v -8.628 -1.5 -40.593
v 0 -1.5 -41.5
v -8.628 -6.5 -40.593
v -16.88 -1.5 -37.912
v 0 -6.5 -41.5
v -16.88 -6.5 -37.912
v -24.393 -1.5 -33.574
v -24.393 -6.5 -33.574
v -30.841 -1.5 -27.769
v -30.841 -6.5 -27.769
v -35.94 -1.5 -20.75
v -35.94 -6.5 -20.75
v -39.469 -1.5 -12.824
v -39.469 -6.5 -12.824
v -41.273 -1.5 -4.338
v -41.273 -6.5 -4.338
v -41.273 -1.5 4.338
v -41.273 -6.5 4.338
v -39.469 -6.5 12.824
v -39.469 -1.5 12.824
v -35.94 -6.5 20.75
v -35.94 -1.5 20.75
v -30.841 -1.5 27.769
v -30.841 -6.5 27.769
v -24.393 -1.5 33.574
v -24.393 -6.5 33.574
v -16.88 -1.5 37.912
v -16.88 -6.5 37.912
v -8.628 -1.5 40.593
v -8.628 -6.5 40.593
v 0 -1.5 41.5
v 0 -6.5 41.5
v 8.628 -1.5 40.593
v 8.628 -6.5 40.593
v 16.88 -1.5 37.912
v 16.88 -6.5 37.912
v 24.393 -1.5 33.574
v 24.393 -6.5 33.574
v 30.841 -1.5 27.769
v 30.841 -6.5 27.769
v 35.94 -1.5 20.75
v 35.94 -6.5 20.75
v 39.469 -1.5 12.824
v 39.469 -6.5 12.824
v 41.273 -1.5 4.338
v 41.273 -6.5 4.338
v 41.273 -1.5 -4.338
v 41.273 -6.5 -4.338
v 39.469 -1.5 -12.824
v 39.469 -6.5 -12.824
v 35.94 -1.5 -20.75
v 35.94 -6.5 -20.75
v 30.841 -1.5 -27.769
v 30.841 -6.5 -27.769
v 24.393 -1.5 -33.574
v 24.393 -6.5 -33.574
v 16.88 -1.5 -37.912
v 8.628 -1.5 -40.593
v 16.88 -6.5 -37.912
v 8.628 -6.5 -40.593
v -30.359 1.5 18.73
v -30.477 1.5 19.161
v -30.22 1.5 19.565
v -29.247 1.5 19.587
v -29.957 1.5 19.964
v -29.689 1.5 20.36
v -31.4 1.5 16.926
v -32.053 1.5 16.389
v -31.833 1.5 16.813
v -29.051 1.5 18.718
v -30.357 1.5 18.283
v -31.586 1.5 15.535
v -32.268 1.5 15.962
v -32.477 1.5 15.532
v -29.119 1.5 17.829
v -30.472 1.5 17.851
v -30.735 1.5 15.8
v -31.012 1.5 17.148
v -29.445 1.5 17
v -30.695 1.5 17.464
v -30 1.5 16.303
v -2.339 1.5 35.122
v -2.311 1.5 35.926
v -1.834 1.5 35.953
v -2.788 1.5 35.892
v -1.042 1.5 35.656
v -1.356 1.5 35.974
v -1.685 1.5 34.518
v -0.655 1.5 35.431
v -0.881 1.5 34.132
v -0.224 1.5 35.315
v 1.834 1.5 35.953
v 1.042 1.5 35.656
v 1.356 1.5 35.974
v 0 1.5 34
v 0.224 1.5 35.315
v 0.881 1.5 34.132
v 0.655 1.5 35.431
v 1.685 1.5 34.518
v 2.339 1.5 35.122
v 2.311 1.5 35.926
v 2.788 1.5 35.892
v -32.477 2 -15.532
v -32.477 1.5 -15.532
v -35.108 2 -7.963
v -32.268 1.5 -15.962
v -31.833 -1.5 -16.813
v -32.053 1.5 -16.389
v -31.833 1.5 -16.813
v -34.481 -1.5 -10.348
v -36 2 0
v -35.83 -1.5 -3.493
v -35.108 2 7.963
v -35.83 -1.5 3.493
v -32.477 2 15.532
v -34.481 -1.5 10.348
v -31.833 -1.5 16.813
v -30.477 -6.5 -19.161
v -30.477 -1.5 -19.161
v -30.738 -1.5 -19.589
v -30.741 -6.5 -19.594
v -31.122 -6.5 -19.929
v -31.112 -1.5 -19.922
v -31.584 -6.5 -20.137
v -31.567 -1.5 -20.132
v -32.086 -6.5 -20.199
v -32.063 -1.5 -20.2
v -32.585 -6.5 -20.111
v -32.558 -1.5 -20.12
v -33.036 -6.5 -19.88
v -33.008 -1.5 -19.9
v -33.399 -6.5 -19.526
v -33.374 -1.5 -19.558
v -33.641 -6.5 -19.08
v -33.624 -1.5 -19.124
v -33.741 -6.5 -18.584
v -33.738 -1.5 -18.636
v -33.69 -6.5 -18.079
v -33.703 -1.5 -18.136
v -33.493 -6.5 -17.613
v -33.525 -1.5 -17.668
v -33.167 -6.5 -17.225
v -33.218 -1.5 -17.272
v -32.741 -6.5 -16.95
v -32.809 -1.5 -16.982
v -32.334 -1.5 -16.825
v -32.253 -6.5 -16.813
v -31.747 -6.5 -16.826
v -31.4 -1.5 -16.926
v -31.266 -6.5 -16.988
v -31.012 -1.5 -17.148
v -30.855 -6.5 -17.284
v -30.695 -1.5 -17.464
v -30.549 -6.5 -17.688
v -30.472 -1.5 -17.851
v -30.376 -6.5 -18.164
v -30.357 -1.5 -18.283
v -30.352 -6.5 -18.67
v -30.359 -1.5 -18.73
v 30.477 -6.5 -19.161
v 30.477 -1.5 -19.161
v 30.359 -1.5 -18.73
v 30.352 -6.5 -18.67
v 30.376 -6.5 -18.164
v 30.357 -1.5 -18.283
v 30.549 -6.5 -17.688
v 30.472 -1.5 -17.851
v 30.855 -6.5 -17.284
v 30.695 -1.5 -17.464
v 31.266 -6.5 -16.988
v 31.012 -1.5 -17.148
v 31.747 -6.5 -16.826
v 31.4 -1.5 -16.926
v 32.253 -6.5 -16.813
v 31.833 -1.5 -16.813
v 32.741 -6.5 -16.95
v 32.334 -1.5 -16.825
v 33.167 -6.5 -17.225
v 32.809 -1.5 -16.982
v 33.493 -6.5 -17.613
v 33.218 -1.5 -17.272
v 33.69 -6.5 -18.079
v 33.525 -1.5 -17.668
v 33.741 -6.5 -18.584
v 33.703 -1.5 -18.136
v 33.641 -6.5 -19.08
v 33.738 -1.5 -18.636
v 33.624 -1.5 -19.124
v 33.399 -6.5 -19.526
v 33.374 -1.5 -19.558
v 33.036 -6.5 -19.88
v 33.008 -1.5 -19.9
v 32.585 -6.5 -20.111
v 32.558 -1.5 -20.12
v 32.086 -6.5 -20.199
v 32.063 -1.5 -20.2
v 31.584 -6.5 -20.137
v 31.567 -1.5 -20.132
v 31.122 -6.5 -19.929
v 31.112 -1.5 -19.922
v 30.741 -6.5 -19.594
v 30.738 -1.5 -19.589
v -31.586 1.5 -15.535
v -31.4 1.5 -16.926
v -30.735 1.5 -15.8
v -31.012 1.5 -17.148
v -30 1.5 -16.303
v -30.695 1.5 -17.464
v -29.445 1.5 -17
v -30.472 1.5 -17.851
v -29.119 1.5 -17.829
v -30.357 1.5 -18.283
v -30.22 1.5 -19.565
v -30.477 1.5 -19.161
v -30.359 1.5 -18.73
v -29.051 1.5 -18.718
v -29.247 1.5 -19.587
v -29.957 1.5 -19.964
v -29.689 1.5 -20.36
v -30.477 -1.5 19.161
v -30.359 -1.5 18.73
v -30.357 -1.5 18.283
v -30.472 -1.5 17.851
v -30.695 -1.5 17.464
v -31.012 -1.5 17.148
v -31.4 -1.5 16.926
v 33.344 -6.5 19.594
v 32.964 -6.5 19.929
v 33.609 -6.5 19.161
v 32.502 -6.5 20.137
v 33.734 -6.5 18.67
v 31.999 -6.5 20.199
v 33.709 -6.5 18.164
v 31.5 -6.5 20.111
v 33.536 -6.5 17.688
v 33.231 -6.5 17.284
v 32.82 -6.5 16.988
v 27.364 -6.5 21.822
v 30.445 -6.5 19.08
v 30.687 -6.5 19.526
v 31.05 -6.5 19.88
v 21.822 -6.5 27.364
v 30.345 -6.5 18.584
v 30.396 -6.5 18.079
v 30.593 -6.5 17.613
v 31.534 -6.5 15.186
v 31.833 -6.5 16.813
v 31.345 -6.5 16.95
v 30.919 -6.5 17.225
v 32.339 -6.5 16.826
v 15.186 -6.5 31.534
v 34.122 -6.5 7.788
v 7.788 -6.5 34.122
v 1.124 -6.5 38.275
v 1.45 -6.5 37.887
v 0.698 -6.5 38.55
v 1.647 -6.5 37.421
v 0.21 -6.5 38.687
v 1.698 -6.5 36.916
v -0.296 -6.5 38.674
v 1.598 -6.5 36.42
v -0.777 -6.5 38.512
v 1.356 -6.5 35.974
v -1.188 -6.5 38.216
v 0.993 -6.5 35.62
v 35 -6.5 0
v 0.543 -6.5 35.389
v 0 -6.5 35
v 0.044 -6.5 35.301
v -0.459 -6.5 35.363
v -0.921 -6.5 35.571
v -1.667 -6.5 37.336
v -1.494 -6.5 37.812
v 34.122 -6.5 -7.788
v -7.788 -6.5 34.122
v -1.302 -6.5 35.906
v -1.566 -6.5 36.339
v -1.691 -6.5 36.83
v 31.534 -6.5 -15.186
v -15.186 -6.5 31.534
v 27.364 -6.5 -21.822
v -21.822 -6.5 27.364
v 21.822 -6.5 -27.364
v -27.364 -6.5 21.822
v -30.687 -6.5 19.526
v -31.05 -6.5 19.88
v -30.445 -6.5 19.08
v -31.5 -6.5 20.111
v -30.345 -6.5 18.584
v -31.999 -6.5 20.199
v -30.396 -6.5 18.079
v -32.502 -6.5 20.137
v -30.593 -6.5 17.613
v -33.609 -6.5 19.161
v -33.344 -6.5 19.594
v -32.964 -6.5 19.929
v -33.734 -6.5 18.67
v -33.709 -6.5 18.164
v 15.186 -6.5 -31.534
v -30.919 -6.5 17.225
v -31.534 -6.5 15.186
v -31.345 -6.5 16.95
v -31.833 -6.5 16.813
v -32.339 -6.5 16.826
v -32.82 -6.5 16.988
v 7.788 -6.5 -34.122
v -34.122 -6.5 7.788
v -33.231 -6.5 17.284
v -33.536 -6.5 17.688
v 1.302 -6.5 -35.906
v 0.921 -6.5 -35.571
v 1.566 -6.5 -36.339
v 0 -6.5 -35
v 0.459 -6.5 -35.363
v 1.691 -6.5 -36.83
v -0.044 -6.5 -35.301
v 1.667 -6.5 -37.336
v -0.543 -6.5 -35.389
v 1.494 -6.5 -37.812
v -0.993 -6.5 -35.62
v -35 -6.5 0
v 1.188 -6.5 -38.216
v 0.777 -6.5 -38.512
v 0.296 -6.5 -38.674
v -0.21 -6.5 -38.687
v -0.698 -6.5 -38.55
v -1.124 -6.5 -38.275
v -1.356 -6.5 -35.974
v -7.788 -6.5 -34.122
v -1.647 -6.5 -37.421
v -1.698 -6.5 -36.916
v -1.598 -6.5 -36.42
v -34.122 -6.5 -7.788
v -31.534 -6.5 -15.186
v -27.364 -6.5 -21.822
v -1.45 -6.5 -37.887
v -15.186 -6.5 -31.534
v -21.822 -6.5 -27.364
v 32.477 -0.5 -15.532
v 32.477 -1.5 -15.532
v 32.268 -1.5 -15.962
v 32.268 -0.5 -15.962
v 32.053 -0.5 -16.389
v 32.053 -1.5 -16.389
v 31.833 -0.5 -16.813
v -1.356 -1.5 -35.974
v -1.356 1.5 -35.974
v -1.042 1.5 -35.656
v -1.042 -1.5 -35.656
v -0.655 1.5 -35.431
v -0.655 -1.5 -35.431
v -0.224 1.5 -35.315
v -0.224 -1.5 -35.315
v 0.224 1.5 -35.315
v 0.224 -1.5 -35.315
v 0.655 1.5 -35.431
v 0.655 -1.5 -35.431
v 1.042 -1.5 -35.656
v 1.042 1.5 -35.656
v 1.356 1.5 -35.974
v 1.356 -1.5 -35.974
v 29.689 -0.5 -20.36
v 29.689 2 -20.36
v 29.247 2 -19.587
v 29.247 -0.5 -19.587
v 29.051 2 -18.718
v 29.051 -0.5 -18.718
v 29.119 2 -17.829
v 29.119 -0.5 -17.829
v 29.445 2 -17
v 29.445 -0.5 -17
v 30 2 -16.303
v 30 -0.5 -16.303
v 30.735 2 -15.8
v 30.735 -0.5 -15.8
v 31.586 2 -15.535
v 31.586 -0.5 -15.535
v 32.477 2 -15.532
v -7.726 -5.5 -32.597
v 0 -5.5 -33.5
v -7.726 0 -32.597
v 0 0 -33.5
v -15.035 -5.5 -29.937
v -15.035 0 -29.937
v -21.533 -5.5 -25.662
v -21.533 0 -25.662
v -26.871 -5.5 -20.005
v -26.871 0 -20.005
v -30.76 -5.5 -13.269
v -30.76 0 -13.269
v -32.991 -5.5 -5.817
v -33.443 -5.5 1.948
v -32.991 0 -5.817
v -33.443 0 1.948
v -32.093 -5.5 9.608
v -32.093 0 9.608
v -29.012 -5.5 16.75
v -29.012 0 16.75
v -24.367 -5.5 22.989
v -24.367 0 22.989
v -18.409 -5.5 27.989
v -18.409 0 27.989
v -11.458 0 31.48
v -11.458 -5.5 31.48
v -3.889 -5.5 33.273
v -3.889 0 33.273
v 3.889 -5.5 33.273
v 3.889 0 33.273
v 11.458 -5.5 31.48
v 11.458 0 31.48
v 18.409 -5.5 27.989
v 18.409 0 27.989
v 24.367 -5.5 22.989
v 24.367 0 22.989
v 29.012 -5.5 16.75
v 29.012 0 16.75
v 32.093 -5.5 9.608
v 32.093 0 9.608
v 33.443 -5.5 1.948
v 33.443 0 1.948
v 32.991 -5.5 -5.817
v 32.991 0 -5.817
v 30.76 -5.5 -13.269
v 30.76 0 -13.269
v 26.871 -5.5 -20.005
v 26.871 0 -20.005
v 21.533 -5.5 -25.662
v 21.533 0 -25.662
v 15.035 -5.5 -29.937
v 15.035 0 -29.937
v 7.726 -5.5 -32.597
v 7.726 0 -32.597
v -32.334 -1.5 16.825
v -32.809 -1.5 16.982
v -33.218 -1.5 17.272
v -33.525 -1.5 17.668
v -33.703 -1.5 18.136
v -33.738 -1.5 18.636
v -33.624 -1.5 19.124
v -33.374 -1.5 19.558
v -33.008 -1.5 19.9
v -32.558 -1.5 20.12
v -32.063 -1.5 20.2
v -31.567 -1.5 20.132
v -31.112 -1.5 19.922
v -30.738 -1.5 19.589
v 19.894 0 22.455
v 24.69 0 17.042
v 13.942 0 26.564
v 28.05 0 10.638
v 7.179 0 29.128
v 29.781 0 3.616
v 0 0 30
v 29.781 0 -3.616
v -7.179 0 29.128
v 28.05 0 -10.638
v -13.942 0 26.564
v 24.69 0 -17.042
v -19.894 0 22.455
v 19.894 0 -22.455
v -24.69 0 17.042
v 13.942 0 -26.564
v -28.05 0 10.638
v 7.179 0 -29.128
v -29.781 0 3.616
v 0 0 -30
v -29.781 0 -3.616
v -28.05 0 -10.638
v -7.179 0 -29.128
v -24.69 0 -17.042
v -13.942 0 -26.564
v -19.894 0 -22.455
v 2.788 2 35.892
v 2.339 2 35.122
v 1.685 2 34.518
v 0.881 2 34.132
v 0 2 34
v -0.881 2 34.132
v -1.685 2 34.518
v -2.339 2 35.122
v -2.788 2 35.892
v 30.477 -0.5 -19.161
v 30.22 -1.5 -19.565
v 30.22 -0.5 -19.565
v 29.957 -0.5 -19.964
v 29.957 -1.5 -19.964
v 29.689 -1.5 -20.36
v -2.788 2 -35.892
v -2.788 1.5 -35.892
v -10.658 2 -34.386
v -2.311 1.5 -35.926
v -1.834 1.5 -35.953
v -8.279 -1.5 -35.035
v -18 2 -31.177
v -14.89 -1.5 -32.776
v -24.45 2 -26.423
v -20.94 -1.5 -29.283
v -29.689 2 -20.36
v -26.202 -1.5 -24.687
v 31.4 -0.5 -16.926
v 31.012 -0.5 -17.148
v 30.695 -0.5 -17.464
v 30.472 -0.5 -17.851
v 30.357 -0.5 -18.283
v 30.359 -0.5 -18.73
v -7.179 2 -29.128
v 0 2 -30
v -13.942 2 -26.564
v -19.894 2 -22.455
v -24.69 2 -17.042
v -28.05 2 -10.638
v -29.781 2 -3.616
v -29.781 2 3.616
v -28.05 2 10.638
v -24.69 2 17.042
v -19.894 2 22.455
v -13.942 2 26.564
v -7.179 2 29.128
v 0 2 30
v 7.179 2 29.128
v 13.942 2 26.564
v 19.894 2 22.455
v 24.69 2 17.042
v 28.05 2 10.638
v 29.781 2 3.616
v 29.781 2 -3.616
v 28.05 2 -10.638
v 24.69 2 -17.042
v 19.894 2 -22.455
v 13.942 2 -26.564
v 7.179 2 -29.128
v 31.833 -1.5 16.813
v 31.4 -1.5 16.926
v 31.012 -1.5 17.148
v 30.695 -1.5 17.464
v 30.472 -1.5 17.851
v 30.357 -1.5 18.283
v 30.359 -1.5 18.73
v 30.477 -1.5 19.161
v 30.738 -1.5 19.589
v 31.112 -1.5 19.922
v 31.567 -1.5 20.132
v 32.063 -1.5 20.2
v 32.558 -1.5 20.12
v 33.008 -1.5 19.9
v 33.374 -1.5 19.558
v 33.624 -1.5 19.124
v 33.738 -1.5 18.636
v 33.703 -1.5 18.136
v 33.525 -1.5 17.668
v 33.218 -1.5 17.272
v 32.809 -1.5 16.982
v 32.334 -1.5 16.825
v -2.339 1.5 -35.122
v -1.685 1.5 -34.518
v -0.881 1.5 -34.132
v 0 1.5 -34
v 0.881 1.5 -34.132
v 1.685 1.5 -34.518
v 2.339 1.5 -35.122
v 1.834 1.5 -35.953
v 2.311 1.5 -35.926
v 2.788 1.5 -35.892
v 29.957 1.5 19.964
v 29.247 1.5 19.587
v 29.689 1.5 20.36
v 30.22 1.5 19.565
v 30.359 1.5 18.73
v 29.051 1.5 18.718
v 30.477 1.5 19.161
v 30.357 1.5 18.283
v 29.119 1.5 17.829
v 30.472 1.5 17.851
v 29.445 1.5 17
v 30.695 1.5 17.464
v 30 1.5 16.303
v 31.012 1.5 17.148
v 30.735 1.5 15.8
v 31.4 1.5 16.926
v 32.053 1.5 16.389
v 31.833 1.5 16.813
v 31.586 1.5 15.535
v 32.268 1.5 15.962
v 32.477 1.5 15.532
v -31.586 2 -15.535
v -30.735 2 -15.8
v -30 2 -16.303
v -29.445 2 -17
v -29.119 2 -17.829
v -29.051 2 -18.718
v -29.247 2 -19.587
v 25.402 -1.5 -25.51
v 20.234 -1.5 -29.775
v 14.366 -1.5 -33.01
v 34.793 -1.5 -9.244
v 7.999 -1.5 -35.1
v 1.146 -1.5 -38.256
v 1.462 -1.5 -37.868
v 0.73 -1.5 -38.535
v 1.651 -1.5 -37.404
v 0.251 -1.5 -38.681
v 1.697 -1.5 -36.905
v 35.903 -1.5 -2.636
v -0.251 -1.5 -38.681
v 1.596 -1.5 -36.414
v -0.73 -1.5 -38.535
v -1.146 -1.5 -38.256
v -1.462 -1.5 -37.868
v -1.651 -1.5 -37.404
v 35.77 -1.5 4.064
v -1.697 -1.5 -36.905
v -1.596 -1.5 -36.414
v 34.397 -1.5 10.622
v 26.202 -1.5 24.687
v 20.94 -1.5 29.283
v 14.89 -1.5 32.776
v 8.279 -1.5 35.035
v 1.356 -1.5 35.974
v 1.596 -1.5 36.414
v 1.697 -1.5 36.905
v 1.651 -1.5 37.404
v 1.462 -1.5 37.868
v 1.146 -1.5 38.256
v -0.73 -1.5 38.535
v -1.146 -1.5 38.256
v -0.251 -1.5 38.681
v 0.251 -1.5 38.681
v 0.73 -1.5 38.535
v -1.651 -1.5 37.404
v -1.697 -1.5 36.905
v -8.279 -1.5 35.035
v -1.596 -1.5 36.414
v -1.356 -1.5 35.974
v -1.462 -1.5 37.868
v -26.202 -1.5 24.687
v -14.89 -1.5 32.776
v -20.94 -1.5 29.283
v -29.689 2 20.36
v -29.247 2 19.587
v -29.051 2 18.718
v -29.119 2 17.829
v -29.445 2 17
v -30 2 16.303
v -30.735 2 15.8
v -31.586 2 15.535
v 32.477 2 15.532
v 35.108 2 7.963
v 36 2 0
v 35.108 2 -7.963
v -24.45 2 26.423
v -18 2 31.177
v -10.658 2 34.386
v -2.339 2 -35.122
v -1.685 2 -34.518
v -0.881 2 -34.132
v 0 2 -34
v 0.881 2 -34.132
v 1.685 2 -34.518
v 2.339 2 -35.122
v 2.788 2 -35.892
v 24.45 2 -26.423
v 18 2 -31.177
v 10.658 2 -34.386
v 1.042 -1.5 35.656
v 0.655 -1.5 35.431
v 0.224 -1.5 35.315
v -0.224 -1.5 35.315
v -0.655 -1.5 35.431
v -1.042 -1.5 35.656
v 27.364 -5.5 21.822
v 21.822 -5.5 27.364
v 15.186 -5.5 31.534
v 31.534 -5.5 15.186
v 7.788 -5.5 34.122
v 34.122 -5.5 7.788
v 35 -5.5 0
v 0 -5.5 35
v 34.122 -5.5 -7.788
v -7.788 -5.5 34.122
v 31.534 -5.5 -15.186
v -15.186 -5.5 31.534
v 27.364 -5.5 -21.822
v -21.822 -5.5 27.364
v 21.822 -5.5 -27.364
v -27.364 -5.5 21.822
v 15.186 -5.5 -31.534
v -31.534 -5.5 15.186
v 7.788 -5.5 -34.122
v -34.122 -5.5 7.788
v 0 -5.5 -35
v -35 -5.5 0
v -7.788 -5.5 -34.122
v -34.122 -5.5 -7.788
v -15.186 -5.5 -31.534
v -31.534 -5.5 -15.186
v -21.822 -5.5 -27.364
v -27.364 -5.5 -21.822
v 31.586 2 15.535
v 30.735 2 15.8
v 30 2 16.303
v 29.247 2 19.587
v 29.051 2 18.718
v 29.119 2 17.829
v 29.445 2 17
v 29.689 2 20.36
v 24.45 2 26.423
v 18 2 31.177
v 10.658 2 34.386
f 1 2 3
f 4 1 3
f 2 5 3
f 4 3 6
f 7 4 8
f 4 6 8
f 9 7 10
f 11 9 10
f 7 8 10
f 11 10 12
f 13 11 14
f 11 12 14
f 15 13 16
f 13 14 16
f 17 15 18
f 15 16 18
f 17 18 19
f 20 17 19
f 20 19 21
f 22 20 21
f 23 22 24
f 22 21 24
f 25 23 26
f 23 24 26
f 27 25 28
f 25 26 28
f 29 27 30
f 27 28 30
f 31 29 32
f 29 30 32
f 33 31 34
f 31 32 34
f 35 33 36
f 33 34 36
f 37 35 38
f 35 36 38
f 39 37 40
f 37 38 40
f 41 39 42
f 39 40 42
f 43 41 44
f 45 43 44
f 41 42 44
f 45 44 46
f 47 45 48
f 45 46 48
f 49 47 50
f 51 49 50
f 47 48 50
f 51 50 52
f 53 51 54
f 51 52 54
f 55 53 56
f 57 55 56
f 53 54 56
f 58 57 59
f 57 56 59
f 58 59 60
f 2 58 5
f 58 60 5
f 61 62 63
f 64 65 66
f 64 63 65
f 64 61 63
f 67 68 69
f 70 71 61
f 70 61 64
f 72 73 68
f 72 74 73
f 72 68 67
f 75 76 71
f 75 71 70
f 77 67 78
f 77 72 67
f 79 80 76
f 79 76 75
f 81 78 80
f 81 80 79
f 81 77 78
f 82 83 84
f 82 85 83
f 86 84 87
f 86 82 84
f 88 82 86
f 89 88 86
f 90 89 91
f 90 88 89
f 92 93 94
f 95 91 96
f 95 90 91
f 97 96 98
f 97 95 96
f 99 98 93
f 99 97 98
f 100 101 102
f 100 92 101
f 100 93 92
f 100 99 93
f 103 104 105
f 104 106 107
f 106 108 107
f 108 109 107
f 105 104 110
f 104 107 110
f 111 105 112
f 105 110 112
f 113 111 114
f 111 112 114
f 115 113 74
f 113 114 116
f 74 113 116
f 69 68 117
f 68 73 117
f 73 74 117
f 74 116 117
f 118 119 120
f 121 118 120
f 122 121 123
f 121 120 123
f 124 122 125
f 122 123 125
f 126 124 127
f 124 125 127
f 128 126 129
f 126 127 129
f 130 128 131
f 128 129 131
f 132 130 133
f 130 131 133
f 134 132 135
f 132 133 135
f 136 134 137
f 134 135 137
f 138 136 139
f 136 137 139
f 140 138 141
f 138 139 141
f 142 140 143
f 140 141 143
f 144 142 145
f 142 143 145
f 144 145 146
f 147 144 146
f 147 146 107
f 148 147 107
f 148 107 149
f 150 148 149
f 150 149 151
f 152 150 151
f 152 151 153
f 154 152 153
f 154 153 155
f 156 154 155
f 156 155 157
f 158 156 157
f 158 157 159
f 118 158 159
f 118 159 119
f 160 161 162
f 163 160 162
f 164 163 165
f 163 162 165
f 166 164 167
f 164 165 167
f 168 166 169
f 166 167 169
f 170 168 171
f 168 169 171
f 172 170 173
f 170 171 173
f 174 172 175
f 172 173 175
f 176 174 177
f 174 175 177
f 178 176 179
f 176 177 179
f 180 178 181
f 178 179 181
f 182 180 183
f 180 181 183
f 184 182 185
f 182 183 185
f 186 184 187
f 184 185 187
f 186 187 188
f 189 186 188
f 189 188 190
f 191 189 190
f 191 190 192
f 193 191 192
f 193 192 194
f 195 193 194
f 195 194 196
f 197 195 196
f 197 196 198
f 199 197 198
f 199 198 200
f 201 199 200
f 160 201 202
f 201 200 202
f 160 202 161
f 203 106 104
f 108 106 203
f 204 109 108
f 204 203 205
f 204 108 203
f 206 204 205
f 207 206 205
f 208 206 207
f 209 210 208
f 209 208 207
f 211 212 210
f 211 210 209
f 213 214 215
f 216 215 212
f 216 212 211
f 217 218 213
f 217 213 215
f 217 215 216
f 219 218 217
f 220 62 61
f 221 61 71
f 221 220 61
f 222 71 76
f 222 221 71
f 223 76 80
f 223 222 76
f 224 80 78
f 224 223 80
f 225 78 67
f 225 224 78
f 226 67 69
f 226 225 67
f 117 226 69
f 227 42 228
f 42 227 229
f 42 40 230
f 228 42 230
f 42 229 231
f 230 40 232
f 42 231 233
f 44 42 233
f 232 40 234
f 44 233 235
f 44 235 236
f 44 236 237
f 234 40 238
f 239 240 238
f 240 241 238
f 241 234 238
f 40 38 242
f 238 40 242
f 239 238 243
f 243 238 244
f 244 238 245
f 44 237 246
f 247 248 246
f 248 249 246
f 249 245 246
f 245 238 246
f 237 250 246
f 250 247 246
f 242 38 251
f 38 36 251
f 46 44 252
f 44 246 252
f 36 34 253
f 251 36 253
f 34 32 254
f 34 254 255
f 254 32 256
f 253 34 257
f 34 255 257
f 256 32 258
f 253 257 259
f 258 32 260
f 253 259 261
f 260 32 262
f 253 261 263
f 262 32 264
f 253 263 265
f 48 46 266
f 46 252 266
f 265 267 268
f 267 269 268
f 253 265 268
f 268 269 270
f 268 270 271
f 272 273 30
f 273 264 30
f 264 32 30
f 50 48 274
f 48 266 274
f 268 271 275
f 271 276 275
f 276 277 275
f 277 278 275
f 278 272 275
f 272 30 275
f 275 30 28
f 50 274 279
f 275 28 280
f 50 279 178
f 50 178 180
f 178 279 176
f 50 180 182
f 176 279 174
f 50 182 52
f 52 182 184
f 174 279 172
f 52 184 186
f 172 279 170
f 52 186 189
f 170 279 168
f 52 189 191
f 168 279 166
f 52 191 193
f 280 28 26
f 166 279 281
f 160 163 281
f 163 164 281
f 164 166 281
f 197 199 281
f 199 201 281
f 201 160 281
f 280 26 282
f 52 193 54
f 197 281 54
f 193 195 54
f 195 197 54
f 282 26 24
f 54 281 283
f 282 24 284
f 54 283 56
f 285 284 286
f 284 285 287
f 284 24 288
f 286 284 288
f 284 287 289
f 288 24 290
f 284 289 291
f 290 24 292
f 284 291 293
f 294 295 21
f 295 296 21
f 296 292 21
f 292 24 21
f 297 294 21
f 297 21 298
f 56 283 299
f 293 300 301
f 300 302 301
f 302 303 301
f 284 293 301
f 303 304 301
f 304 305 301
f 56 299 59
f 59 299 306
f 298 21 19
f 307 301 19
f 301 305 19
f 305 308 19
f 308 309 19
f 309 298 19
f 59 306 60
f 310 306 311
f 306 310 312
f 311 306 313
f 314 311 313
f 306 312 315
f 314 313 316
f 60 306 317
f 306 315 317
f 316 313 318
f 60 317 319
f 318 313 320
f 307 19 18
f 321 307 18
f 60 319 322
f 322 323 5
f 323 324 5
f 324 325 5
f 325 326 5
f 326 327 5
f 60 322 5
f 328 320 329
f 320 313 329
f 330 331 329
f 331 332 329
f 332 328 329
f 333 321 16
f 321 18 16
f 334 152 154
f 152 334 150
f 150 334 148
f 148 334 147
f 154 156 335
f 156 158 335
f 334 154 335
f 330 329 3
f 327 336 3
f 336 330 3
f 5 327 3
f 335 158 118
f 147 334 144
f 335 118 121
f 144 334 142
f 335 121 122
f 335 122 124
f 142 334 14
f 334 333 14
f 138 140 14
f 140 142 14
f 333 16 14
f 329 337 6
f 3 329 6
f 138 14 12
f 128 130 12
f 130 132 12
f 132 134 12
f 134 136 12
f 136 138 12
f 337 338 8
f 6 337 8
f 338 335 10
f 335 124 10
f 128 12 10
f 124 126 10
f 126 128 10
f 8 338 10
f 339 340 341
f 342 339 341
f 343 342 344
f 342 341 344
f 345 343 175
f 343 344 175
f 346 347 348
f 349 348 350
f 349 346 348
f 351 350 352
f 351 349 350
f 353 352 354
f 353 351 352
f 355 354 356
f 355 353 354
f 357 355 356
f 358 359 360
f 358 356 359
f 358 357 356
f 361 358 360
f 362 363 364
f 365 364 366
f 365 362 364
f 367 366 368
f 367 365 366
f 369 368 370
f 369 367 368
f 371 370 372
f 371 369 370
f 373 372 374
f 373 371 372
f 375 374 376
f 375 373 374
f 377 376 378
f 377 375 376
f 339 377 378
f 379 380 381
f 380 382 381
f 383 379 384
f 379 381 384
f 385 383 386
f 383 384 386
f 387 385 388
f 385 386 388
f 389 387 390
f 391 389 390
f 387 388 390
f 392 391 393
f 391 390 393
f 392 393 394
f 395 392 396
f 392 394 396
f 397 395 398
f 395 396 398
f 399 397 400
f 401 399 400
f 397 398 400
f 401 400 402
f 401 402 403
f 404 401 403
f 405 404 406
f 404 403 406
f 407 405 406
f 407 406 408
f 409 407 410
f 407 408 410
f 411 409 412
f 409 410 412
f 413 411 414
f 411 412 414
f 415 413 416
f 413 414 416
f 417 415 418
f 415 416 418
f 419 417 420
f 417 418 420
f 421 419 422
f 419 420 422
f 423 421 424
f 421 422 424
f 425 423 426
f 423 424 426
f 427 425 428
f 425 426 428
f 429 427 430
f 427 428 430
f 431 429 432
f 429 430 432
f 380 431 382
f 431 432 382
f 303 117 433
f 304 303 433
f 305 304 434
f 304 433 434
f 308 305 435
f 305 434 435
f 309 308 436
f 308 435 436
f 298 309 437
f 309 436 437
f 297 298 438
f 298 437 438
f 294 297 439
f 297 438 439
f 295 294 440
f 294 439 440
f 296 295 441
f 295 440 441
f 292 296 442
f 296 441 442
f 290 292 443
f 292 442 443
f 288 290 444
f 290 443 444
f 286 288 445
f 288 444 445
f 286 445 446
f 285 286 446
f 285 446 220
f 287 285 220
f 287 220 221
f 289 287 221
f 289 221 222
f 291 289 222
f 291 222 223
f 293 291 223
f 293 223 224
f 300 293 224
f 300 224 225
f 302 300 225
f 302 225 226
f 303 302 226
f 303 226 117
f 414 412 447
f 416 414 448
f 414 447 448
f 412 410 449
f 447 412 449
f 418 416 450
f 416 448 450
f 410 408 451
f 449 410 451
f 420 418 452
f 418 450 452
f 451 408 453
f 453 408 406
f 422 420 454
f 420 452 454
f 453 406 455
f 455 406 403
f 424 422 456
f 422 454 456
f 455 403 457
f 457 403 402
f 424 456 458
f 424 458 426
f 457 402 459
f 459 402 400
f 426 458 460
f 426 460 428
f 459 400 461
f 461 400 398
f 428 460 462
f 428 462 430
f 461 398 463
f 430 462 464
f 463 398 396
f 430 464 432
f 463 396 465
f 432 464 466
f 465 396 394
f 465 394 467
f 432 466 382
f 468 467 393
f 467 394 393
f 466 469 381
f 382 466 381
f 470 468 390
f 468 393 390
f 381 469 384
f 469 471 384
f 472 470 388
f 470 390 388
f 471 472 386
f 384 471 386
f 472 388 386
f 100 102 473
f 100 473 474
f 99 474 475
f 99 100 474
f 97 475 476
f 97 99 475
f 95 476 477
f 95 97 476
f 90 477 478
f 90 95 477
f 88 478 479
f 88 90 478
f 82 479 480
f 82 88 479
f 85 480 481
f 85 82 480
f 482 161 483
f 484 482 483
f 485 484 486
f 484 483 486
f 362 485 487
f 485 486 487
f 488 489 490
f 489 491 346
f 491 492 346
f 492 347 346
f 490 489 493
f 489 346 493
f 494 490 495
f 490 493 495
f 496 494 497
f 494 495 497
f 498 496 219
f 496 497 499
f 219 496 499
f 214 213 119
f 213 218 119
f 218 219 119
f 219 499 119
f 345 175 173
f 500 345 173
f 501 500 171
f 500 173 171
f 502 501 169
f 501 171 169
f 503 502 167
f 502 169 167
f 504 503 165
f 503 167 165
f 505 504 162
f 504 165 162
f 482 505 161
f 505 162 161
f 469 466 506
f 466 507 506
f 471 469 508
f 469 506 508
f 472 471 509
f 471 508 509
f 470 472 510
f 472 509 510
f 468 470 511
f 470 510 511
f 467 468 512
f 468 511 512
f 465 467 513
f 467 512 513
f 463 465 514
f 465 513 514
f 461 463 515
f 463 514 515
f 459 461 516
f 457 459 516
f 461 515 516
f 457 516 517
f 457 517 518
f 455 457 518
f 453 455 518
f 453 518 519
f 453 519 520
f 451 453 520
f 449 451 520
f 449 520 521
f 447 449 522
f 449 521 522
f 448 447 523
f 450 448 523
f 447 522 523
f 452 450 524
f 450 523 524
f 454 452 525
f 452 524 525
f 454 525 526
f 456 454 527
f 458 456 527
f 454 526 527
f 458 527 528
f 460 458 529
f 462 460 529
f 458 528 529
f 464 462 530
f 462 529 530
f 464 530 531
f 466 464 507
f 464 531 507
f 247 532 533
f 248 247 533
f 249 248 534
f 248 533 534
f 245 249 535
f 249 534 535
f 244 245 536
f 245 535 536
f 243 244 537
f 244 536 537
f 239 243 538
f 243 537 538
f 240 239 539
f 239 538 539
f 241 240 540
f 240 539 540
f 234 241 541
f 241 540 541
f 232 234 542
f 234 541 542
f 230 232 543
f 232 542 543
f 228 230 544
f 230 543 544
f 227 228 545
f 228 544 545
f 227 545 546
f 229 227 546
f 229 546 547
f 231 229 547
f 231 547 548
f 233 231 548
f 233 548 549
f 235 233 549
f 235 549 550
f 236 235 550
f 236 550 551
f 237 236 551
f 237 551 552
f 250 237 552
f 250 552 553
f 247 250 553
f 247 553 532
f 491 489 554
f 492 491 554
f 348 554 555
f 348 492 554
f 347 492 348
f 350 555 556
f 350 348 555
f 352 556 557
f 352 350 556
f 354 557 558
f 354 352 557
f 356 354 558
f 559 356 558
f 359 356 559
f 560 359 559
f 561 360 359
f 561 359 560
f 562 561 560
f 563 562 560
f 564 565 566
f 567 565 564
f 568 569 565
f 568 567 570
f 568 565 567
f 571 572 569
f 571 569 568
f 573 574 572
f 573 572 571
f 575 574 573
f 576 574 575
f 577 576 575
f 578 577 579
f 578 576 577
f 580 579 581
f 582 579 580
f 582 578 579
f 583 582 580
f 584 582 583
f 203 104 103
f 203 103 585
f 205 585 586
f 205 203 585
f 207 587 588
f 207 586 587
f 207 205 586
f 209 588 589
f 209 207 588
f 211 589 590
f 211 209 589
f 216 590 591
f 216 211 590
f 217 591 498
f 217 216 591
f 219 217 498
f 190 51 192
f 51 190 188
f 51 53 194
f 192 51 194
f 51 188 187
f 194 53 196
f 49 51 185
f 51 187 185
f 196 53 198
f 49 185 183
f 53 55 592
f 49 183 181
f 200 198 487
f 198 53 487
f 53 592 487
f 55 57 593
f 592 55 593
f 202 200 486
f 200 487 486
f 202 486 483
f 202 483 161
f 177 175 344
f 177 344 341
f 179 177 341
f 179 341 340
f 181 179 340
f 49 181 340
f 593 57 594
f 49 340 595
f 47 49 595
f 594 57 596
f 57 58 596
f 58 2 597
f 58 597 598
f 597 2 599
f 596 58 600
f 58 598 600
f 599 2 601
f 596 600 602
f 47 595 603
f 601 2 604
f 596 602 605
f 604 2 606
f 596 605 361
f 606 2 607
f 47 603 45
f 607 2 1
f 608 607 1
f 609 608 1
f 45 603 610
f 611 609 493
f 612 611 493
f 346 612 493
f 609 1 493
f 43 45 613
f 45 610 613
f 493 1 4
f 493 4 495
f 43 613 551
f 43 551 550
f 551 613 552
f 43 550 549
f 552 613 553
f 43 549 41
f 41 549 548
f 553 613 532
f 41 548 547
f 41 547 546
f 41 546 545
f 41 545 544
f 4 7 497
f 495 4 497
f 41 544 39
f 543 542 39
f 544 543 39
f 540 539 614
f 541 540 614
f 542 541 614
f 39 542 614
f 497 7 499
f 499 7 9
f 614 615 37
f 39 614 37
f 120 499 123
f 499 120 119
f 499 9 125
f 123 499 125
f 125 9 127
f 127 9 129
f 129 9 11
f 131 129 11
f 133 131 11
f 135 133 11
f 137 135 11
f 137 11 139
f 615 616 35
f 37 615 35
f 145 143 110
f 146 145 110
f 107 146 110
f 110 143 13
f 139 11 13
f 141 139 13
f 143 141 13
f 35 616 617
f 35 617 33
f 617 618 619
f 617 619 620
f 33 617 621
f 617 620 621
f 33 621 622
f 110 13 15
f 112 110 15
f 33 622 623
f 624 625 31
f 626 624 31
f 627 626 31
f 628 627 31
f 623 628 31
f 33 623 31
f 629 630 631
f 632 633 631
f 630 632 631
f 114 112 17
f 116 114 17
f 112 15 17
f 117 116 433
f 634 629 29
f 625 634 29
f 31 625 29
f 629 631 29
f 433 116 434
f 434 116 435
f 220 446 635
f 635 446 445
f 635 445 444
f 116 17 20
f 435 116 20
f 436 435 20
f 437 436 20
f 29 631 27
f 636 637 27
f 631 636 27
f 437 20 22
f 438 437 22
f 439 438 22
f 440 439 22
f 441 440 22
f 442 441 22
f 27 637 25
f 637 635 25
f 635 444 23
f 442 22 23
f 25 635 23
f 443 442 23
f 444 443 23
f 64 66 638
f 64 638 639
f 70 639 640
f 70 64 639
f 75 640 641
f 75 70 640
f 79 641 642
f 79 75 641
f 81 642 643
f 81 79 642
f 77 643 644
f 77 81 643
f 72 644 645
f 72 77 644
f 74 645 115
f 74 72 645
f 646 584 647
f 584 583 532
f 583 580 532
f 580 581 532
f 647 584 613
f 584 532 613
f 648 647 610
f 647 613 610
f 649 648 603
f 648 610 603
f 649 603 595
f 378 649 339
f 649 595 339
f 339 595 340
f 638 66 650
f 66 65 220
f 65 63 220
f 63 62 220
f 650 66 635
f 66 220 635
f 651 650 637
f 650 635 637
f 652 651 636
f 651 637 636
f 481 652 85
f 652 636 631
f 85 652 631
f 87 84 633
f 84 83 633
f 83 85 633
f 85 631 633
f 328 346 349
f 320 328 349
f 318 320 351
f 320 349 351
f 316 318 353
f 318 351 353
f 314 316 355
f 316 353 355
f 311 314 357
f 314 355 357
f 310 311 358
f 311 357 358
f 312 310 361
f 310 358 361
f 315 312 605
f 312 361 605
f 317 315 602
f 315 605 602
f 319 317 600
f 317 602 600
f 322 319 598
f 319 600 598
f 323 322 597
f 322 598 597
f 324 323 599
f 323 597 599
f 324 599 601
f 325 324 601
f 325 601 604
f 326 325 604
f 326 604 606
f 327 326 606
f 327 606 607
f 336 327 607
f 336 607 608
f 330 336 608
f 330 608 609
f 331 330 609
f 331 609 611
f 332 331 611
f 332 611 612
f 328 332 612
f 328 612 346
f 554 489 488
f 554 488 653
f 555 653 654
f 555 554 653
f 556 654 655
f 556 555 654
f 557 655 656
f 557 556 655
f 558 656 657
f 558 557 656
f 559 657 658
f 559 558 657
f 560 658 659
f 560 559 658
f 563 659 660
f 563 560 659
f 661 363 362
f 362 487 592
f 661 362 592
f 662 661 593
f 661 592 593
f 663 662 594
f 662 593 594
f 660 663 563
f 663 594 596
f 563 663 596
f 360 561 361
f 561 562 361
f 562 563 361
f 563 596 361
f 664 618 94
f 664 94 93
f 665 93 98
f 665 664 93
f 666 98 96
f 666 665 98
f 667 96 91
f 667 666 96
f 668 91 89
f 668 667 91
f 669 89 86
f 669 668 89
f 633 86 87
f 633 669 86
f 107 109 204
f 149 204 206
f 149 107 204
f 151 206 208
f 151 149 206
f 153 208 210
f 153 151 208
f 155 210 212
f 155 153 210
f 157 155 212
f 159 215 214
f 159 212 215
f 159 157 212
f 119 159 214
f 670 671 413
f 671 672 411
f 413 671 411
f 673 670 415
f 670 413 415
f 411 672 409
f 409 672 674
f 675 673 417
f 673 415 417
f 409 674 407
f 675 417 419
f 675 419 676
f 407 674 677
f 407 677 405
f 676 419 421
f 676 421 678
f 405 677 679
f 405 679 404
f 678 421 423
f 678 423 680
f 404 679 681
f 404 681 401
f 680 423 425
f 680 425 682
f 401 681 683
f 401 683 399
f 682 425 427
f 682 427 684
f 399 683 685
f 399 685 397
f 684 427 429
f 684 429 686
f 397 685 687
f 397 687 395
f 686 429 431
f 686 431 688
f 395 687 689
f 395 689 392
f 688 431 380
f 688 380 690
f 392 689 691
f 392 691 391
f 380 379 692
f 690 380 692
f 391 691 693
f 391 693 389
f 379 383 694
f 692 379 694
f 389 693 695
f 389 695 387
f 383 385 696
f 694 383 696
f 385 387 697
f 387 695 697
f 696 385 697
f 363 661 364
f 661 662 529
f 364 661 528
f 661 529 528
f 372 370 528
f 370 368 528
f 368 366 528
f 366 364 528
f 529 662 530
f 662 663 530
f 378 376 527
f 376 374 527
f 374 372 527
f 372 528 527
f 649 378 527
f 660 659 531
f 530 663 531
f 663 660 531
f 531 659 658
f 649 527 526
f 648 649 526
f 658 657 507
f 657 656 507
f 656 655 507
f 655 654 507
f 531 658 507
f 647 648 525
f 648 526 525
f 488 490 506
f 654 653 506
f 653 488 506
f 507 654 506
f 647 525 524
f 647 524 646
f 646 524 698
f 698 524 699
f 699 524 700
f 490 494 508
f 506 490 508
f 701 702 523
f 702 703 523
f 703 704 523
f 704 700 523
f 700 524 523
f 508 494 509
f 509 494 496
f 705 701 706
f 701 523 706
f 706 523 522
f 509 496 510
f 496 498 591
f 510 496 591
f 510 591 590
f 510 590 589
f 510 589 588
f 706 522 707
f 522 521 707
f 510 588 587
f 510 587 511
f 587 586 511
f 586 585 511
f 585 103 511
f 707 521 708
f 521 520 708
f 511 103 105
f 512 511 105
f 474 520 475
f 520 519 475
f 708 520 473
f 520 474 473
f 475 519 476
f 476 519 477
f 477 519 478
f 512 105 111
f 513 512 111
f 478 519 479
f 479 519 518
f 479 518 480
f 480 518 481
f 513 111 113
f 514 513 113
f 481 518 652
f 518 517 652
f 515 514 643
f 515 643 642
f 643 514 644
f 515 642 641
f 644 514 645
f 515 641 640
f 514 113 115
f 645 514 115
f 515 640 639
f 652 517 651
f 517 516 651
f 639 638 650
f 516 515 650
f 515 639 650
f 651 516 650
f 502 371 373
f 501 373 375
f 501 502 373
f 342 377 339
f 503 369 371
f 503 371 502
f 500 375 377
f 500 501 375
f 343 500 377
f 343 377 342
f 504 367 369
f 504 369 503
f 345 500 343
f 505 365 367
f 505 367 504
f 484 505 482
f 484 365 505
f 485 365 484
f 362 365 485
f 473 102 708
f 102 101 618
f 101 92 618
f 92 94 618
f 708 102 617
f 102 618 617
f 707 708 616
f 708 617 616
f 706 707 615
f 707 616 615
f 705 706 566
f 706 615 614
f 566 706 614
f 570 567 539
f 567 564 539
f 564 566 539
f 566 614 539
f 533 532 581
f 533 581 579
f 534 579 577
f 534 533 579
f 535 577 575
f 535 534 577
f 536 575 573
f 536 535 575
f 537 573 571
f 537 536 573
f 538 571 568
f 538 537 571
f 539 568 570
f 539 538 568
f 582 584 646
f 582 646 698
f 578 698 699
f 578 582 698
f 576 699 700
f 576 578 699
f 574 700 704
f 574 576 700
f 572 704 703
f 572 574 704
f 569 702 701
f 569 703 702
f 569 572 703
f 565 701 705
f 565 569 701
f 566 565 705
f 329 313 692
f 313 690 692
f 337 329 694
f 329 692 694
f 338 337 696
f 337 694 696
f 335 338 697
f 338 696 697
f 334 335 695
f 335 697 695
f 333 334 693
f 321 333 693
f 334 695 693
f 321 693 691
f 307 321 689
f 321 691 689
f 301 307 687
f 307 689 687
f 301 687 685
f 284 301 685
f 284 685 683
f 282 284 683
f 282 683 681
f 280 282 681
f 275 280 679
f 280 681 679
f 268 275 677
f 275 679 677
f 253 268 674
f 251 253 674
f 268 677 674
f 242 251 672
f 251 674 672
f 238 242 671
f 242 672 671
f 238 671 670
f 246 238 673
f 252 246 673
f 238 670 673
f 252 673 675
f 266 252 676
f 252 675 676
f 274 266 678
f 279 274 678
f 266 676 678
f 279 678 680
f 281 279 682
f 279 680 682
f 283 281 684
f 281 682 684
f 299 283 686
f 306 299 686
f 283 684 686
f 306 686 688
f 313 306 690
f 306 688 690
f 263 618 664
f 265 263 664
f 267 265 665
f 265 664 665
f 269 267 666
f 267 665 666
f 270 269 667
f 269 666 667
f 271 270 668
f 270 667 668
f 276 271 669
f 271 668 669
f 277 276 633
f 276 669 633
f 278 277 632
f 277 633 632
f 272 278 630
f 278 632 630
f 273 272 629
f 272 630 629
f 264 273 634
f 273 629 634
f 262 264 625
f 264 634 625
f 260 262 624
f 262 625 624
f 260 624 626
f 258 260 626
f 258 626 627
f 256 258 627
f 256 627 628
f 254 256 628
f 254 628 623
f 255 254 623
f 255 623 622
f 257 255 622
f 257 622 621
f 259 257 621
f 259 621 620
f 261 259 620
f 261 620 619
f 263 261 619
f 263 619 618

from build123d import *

# Parameters (mm, degrees)
SKETCH_3_R                      = 1.7
CUT_EXTRUDE_1_DEPTH             = 10
CUT_EXTRUDE_1_DIRECTION_2_REACH = 60.902
CUT_EXTRUDE_START               = 3
SKETCH_4_R                      = 3
CUT_EXTRUDE_2_DEPTH             = 3
SKETCH_7_R                      = 3
CUT_EXTRUDE_3_DEPTH             = 10
EXTRUDE_1_DEPTH                 = 1


with BuildPart() as part:
    # 草图2 → 旋转1 (revolve)
    with BuildSketch(Plane(origin=(0, 0, 0), x_dir=(0, 0, -1), z_dir=(1, 0, 0))):
        Polygon((-30, 0), (-30, 2), (-36, 2), (-36, -1.5), (-41.5, -1.5), (-41.5, -6.5), (-35, -6.5), (-35, -5.5), (-33.5, -5.5), (-33.5, 0), align=None)
    revolve(axis=Axis((0, 0, 0), (0, 1, 0)))

    # 草图3 → 切除-拉伸1 (cut)
    with BuildSketch(Plane(origin=(0, -1.5, 0), x_dir=(1, 0, 0), z_dir=(0, 1, 0))):
        with Locations((0, 37)):
            Circle(SKETCH_3_R)
        with Locations((32.04293994, 18.5)):
            Circle(SKETCH_3_R)
        with Locations((32.04293994, -18.5)):
            Circle(SKETCH_3_R)
        with Locations((0, -37)):
            Circle(SKETCH_3_R)
        with Locations((-32.04293994, -18.5)):
            Circle(SKETCH_3_R)
        with Locations((-32.04293994, 18.5)):
            Circle(SKETCH_3_R)
    extrude(amount=-CUT_EXTRUDE_1_DEPTH, mode=Mode.SUBTRACT)

    # 草图3 → 切除-拉伸1 direction 2 (cut, up to next)
    with BuildSketch(Plane(origin=(0, -1.5, 0), x_dir=(1, 0, 0), z_dir=(0, 1, 0)), mode=Mode.PRIVATE) as cut_extrude_1_direction_2_sk1:
        with Locations((0, 37)):
            Circle(SKETCH_3_R)
    cut_extrude_1_direction_2_tool1 = extrude(cut_extrude_1_direction_2_sk1.sketch, amount=CUT_EXTRUDE_1_DIRECTION_2_REACH, mode=Mode.PRIVATE) & part.part
    # 草图3 → 切除-拉伸1 direction 2 (cut, up to next)
    with BuildSketch(Plane(origin=(0, -1.5, 0), x_dir=(1, 0, 0), z_dir=(0, 1, 0)), mode=Mode.PRIVATE) as cut_extrude_1_direction_2_sk2:
        with Locations((32.04293994, 18.5)):
            Circle(SKETCH_3_R)
    cut_extrude_1_direction_2_tool2 = extrude(cut_extrude_1_direction_2_sk2.sketch, amount=CUT_EXTRUDE_1_DIRECTION_2_REACH, mode=Mode.PRIVATE) & part.part
    # 草图3 → 切除-拉伸1 direction 2 (cut, up to next)
    with BuildSketch(Plane(origin=(0, -1.5, 0), x_dir=(1, 0, 0), z_dir=(0, 1, 0)), mode=Mode.PRIVATE) as cut_extrude_1_direction_2_sk3:
        with Locations((32.04293994, -18.5)):
            Circle(SKETCH_3_R)
    cut_extrude_1_direction_2_tool3 = extrude(cut_extrude_1_direction_2_sk3.sketch, amount=CUT_EXTRUDE_1_DIRECTION_2_REACH, mode=Mode.PRIVATE) & part.part
    # 草图3 → 切除-拉伸1 direction 2 (cut, up to next)
    with BuildSketch(Plane(origin=(0, -1.5, 0), x_dir=(1, 0, 0), z_dir=(0, 1, 0)), mode=Mode.PRIVATE) as cut_extrude_1_direction_2_sk4:
        with Locations((0, -37)):
            Circle(SKETCH_3_R)
    cut_extrude_1_direction_2_tool4 = extrude(cut_extrude_1_direction_2_sk4.sketch, amount=CUT_EXTRUDE_1_DIRECTION_2_REACH, mode=Mode.PRIVATE) & part.part
    # 草图3 → 切除-拉伸1 direction 2 (cut, up to next)
    with BuildSketch(Plane(origin=(0, -1.5, 0), x_dir=(1, 0, 0), z_dir=(0, 1, 0)), mode=Mode.PRIVATE) as cut_extrude_1_direction_2_sk5:
        with Locations((-32.04293994, -18.5)):
            Circle(SKETCH_3_R)
    cut_extrude_1_direction_2_tool5 = extrude(cut_extrude_1_direction_2_sk5.sketch, amount=CUT_EXTRUDE_1_DIRECTION_2_REACH, mode=Mode.PRIVATE) & part.part
    # 草图3 → 切除-拉伸1 direction 2 (cut, up to next)
    with BuildSketch(Plane(origin=(0, -1.5, 0), x_dir=(1, 0, 0), z_dir=(0, 1, 0)), mode=Mode.PRIVATE) as cut_extrude_1_direction_2_sk6:
        with Locations((-32.04293994, 18.5)):
            Circle(SKETCH_3_R)
    cut_extrude_1_direction_2_tool6 = extrude(cut_extrude_1_direction_2_sk6.sketch, amount=CUT_EXTRUDE_1_DIRECTION_2_REACH, mode=Mode.PRIVATE) & part.part
    add(cut_extrude_1_direction_2_tool1.solids().sort_by_distance((0, -1.5, -37))[0], mode=Mode.SUBTRACT)
    add(cut_extrude_1_direction_2_tool2.solids().sort_by_distance((32.04294, -1.5, -18.5))[0], mode=Mode.SUBTRACT)
    add(cut_extrude_1_direction_2_tool3.solids().sort_by_distance((32.04294, -1.5, 18.5))[0], mode=Mode.SUBTRACT)
    add(cut_extrude_1_direction_2_tool4.solids().sort_by_distance((0, -1.5, 37))[0], mode=Mode.SUBTRACT)
    add(cut_extrude_1_direction_2_tool5.solids().sort_by_distance((-32.04294, -1.5, 18.5))[0], mode=Mode.SUBTRACT)
    add(cut_extrude_1_direction_2_tool6.solids().sort_by_distance((-32.04294, -1.5, -18.5))[0], mode=Mode.SUBTRACT)

    # 草图4 → 切除-拉伸2 (cut)
    with BuildSketch(Plane(origin=(0, -1.5, 0), x_dir=(1, 0, 0), z_dir=(0, 1, 0)).offset(CUT_EXTRUDE_START)):
        with Locations((0, 37)):
            Circle(SKETCH_4_R)
        with Locations((32.04293994, 18.5)):
            Circle(SKETCH_4_R)
        with Locations((32.04293994, -18.5)):
            Circle(SKETCH_4_R)
        with Locations((0, -37)):
            Circle(SKETCH_4_R)
        with Locations((-32.04293994, -18.5)):
            Circle(SKETCH_4_R)
        with Locations((-32.04293994, 18.5)):
            Circle(SKETCH_4_R)
    extrude(amount=CUT_EXTRUDE_2_DEPTH, mode=Mode.SUBTRACT)

    # 草图7 → 切除-拉伸3 (cut)
    with BuildSketch(Plane(origin=(0, -1.5, 0), x_dir=(1, 0, 0), z_dir=(0, 1, 0))):
        with Locations((32.04293994, 18.5)):
            Circle(SKETCH_7_R)
    extrude(amount=CUT_EXTRUDE_3_DEPTH, mode=Mode.SUBTRACT)

    # 草图8 → 凸台-拉伸1 (add)
    with BuildSketch(Plane(origin=(0, -1.5, 0), x_dir=(1, 0, 0), z_dir=(0, 1, 0))):
        with BuildLine():
            ThreePointArc((30.476882326, 19.161410274), (30.089095942, 19.764774357), (29.689366173, 20.360293128))
            ThreePointArc((29.689366173, 20.360293128), (29.444863729, 17), (32.477214164, 15.531598764))
            ThreePointArc((32.477214164, 15.531598764), (32.161344664, 16.175534285), (31.832709232, 16.813049186))
            ThreePointArc((31.832709232, 16.813049186), (30.570696754, 17.65), (30.476882326, 19.161410274))
        make_face()
    extrude(amount=EXTRUDE_1_DEPTH)


solid = part.part
